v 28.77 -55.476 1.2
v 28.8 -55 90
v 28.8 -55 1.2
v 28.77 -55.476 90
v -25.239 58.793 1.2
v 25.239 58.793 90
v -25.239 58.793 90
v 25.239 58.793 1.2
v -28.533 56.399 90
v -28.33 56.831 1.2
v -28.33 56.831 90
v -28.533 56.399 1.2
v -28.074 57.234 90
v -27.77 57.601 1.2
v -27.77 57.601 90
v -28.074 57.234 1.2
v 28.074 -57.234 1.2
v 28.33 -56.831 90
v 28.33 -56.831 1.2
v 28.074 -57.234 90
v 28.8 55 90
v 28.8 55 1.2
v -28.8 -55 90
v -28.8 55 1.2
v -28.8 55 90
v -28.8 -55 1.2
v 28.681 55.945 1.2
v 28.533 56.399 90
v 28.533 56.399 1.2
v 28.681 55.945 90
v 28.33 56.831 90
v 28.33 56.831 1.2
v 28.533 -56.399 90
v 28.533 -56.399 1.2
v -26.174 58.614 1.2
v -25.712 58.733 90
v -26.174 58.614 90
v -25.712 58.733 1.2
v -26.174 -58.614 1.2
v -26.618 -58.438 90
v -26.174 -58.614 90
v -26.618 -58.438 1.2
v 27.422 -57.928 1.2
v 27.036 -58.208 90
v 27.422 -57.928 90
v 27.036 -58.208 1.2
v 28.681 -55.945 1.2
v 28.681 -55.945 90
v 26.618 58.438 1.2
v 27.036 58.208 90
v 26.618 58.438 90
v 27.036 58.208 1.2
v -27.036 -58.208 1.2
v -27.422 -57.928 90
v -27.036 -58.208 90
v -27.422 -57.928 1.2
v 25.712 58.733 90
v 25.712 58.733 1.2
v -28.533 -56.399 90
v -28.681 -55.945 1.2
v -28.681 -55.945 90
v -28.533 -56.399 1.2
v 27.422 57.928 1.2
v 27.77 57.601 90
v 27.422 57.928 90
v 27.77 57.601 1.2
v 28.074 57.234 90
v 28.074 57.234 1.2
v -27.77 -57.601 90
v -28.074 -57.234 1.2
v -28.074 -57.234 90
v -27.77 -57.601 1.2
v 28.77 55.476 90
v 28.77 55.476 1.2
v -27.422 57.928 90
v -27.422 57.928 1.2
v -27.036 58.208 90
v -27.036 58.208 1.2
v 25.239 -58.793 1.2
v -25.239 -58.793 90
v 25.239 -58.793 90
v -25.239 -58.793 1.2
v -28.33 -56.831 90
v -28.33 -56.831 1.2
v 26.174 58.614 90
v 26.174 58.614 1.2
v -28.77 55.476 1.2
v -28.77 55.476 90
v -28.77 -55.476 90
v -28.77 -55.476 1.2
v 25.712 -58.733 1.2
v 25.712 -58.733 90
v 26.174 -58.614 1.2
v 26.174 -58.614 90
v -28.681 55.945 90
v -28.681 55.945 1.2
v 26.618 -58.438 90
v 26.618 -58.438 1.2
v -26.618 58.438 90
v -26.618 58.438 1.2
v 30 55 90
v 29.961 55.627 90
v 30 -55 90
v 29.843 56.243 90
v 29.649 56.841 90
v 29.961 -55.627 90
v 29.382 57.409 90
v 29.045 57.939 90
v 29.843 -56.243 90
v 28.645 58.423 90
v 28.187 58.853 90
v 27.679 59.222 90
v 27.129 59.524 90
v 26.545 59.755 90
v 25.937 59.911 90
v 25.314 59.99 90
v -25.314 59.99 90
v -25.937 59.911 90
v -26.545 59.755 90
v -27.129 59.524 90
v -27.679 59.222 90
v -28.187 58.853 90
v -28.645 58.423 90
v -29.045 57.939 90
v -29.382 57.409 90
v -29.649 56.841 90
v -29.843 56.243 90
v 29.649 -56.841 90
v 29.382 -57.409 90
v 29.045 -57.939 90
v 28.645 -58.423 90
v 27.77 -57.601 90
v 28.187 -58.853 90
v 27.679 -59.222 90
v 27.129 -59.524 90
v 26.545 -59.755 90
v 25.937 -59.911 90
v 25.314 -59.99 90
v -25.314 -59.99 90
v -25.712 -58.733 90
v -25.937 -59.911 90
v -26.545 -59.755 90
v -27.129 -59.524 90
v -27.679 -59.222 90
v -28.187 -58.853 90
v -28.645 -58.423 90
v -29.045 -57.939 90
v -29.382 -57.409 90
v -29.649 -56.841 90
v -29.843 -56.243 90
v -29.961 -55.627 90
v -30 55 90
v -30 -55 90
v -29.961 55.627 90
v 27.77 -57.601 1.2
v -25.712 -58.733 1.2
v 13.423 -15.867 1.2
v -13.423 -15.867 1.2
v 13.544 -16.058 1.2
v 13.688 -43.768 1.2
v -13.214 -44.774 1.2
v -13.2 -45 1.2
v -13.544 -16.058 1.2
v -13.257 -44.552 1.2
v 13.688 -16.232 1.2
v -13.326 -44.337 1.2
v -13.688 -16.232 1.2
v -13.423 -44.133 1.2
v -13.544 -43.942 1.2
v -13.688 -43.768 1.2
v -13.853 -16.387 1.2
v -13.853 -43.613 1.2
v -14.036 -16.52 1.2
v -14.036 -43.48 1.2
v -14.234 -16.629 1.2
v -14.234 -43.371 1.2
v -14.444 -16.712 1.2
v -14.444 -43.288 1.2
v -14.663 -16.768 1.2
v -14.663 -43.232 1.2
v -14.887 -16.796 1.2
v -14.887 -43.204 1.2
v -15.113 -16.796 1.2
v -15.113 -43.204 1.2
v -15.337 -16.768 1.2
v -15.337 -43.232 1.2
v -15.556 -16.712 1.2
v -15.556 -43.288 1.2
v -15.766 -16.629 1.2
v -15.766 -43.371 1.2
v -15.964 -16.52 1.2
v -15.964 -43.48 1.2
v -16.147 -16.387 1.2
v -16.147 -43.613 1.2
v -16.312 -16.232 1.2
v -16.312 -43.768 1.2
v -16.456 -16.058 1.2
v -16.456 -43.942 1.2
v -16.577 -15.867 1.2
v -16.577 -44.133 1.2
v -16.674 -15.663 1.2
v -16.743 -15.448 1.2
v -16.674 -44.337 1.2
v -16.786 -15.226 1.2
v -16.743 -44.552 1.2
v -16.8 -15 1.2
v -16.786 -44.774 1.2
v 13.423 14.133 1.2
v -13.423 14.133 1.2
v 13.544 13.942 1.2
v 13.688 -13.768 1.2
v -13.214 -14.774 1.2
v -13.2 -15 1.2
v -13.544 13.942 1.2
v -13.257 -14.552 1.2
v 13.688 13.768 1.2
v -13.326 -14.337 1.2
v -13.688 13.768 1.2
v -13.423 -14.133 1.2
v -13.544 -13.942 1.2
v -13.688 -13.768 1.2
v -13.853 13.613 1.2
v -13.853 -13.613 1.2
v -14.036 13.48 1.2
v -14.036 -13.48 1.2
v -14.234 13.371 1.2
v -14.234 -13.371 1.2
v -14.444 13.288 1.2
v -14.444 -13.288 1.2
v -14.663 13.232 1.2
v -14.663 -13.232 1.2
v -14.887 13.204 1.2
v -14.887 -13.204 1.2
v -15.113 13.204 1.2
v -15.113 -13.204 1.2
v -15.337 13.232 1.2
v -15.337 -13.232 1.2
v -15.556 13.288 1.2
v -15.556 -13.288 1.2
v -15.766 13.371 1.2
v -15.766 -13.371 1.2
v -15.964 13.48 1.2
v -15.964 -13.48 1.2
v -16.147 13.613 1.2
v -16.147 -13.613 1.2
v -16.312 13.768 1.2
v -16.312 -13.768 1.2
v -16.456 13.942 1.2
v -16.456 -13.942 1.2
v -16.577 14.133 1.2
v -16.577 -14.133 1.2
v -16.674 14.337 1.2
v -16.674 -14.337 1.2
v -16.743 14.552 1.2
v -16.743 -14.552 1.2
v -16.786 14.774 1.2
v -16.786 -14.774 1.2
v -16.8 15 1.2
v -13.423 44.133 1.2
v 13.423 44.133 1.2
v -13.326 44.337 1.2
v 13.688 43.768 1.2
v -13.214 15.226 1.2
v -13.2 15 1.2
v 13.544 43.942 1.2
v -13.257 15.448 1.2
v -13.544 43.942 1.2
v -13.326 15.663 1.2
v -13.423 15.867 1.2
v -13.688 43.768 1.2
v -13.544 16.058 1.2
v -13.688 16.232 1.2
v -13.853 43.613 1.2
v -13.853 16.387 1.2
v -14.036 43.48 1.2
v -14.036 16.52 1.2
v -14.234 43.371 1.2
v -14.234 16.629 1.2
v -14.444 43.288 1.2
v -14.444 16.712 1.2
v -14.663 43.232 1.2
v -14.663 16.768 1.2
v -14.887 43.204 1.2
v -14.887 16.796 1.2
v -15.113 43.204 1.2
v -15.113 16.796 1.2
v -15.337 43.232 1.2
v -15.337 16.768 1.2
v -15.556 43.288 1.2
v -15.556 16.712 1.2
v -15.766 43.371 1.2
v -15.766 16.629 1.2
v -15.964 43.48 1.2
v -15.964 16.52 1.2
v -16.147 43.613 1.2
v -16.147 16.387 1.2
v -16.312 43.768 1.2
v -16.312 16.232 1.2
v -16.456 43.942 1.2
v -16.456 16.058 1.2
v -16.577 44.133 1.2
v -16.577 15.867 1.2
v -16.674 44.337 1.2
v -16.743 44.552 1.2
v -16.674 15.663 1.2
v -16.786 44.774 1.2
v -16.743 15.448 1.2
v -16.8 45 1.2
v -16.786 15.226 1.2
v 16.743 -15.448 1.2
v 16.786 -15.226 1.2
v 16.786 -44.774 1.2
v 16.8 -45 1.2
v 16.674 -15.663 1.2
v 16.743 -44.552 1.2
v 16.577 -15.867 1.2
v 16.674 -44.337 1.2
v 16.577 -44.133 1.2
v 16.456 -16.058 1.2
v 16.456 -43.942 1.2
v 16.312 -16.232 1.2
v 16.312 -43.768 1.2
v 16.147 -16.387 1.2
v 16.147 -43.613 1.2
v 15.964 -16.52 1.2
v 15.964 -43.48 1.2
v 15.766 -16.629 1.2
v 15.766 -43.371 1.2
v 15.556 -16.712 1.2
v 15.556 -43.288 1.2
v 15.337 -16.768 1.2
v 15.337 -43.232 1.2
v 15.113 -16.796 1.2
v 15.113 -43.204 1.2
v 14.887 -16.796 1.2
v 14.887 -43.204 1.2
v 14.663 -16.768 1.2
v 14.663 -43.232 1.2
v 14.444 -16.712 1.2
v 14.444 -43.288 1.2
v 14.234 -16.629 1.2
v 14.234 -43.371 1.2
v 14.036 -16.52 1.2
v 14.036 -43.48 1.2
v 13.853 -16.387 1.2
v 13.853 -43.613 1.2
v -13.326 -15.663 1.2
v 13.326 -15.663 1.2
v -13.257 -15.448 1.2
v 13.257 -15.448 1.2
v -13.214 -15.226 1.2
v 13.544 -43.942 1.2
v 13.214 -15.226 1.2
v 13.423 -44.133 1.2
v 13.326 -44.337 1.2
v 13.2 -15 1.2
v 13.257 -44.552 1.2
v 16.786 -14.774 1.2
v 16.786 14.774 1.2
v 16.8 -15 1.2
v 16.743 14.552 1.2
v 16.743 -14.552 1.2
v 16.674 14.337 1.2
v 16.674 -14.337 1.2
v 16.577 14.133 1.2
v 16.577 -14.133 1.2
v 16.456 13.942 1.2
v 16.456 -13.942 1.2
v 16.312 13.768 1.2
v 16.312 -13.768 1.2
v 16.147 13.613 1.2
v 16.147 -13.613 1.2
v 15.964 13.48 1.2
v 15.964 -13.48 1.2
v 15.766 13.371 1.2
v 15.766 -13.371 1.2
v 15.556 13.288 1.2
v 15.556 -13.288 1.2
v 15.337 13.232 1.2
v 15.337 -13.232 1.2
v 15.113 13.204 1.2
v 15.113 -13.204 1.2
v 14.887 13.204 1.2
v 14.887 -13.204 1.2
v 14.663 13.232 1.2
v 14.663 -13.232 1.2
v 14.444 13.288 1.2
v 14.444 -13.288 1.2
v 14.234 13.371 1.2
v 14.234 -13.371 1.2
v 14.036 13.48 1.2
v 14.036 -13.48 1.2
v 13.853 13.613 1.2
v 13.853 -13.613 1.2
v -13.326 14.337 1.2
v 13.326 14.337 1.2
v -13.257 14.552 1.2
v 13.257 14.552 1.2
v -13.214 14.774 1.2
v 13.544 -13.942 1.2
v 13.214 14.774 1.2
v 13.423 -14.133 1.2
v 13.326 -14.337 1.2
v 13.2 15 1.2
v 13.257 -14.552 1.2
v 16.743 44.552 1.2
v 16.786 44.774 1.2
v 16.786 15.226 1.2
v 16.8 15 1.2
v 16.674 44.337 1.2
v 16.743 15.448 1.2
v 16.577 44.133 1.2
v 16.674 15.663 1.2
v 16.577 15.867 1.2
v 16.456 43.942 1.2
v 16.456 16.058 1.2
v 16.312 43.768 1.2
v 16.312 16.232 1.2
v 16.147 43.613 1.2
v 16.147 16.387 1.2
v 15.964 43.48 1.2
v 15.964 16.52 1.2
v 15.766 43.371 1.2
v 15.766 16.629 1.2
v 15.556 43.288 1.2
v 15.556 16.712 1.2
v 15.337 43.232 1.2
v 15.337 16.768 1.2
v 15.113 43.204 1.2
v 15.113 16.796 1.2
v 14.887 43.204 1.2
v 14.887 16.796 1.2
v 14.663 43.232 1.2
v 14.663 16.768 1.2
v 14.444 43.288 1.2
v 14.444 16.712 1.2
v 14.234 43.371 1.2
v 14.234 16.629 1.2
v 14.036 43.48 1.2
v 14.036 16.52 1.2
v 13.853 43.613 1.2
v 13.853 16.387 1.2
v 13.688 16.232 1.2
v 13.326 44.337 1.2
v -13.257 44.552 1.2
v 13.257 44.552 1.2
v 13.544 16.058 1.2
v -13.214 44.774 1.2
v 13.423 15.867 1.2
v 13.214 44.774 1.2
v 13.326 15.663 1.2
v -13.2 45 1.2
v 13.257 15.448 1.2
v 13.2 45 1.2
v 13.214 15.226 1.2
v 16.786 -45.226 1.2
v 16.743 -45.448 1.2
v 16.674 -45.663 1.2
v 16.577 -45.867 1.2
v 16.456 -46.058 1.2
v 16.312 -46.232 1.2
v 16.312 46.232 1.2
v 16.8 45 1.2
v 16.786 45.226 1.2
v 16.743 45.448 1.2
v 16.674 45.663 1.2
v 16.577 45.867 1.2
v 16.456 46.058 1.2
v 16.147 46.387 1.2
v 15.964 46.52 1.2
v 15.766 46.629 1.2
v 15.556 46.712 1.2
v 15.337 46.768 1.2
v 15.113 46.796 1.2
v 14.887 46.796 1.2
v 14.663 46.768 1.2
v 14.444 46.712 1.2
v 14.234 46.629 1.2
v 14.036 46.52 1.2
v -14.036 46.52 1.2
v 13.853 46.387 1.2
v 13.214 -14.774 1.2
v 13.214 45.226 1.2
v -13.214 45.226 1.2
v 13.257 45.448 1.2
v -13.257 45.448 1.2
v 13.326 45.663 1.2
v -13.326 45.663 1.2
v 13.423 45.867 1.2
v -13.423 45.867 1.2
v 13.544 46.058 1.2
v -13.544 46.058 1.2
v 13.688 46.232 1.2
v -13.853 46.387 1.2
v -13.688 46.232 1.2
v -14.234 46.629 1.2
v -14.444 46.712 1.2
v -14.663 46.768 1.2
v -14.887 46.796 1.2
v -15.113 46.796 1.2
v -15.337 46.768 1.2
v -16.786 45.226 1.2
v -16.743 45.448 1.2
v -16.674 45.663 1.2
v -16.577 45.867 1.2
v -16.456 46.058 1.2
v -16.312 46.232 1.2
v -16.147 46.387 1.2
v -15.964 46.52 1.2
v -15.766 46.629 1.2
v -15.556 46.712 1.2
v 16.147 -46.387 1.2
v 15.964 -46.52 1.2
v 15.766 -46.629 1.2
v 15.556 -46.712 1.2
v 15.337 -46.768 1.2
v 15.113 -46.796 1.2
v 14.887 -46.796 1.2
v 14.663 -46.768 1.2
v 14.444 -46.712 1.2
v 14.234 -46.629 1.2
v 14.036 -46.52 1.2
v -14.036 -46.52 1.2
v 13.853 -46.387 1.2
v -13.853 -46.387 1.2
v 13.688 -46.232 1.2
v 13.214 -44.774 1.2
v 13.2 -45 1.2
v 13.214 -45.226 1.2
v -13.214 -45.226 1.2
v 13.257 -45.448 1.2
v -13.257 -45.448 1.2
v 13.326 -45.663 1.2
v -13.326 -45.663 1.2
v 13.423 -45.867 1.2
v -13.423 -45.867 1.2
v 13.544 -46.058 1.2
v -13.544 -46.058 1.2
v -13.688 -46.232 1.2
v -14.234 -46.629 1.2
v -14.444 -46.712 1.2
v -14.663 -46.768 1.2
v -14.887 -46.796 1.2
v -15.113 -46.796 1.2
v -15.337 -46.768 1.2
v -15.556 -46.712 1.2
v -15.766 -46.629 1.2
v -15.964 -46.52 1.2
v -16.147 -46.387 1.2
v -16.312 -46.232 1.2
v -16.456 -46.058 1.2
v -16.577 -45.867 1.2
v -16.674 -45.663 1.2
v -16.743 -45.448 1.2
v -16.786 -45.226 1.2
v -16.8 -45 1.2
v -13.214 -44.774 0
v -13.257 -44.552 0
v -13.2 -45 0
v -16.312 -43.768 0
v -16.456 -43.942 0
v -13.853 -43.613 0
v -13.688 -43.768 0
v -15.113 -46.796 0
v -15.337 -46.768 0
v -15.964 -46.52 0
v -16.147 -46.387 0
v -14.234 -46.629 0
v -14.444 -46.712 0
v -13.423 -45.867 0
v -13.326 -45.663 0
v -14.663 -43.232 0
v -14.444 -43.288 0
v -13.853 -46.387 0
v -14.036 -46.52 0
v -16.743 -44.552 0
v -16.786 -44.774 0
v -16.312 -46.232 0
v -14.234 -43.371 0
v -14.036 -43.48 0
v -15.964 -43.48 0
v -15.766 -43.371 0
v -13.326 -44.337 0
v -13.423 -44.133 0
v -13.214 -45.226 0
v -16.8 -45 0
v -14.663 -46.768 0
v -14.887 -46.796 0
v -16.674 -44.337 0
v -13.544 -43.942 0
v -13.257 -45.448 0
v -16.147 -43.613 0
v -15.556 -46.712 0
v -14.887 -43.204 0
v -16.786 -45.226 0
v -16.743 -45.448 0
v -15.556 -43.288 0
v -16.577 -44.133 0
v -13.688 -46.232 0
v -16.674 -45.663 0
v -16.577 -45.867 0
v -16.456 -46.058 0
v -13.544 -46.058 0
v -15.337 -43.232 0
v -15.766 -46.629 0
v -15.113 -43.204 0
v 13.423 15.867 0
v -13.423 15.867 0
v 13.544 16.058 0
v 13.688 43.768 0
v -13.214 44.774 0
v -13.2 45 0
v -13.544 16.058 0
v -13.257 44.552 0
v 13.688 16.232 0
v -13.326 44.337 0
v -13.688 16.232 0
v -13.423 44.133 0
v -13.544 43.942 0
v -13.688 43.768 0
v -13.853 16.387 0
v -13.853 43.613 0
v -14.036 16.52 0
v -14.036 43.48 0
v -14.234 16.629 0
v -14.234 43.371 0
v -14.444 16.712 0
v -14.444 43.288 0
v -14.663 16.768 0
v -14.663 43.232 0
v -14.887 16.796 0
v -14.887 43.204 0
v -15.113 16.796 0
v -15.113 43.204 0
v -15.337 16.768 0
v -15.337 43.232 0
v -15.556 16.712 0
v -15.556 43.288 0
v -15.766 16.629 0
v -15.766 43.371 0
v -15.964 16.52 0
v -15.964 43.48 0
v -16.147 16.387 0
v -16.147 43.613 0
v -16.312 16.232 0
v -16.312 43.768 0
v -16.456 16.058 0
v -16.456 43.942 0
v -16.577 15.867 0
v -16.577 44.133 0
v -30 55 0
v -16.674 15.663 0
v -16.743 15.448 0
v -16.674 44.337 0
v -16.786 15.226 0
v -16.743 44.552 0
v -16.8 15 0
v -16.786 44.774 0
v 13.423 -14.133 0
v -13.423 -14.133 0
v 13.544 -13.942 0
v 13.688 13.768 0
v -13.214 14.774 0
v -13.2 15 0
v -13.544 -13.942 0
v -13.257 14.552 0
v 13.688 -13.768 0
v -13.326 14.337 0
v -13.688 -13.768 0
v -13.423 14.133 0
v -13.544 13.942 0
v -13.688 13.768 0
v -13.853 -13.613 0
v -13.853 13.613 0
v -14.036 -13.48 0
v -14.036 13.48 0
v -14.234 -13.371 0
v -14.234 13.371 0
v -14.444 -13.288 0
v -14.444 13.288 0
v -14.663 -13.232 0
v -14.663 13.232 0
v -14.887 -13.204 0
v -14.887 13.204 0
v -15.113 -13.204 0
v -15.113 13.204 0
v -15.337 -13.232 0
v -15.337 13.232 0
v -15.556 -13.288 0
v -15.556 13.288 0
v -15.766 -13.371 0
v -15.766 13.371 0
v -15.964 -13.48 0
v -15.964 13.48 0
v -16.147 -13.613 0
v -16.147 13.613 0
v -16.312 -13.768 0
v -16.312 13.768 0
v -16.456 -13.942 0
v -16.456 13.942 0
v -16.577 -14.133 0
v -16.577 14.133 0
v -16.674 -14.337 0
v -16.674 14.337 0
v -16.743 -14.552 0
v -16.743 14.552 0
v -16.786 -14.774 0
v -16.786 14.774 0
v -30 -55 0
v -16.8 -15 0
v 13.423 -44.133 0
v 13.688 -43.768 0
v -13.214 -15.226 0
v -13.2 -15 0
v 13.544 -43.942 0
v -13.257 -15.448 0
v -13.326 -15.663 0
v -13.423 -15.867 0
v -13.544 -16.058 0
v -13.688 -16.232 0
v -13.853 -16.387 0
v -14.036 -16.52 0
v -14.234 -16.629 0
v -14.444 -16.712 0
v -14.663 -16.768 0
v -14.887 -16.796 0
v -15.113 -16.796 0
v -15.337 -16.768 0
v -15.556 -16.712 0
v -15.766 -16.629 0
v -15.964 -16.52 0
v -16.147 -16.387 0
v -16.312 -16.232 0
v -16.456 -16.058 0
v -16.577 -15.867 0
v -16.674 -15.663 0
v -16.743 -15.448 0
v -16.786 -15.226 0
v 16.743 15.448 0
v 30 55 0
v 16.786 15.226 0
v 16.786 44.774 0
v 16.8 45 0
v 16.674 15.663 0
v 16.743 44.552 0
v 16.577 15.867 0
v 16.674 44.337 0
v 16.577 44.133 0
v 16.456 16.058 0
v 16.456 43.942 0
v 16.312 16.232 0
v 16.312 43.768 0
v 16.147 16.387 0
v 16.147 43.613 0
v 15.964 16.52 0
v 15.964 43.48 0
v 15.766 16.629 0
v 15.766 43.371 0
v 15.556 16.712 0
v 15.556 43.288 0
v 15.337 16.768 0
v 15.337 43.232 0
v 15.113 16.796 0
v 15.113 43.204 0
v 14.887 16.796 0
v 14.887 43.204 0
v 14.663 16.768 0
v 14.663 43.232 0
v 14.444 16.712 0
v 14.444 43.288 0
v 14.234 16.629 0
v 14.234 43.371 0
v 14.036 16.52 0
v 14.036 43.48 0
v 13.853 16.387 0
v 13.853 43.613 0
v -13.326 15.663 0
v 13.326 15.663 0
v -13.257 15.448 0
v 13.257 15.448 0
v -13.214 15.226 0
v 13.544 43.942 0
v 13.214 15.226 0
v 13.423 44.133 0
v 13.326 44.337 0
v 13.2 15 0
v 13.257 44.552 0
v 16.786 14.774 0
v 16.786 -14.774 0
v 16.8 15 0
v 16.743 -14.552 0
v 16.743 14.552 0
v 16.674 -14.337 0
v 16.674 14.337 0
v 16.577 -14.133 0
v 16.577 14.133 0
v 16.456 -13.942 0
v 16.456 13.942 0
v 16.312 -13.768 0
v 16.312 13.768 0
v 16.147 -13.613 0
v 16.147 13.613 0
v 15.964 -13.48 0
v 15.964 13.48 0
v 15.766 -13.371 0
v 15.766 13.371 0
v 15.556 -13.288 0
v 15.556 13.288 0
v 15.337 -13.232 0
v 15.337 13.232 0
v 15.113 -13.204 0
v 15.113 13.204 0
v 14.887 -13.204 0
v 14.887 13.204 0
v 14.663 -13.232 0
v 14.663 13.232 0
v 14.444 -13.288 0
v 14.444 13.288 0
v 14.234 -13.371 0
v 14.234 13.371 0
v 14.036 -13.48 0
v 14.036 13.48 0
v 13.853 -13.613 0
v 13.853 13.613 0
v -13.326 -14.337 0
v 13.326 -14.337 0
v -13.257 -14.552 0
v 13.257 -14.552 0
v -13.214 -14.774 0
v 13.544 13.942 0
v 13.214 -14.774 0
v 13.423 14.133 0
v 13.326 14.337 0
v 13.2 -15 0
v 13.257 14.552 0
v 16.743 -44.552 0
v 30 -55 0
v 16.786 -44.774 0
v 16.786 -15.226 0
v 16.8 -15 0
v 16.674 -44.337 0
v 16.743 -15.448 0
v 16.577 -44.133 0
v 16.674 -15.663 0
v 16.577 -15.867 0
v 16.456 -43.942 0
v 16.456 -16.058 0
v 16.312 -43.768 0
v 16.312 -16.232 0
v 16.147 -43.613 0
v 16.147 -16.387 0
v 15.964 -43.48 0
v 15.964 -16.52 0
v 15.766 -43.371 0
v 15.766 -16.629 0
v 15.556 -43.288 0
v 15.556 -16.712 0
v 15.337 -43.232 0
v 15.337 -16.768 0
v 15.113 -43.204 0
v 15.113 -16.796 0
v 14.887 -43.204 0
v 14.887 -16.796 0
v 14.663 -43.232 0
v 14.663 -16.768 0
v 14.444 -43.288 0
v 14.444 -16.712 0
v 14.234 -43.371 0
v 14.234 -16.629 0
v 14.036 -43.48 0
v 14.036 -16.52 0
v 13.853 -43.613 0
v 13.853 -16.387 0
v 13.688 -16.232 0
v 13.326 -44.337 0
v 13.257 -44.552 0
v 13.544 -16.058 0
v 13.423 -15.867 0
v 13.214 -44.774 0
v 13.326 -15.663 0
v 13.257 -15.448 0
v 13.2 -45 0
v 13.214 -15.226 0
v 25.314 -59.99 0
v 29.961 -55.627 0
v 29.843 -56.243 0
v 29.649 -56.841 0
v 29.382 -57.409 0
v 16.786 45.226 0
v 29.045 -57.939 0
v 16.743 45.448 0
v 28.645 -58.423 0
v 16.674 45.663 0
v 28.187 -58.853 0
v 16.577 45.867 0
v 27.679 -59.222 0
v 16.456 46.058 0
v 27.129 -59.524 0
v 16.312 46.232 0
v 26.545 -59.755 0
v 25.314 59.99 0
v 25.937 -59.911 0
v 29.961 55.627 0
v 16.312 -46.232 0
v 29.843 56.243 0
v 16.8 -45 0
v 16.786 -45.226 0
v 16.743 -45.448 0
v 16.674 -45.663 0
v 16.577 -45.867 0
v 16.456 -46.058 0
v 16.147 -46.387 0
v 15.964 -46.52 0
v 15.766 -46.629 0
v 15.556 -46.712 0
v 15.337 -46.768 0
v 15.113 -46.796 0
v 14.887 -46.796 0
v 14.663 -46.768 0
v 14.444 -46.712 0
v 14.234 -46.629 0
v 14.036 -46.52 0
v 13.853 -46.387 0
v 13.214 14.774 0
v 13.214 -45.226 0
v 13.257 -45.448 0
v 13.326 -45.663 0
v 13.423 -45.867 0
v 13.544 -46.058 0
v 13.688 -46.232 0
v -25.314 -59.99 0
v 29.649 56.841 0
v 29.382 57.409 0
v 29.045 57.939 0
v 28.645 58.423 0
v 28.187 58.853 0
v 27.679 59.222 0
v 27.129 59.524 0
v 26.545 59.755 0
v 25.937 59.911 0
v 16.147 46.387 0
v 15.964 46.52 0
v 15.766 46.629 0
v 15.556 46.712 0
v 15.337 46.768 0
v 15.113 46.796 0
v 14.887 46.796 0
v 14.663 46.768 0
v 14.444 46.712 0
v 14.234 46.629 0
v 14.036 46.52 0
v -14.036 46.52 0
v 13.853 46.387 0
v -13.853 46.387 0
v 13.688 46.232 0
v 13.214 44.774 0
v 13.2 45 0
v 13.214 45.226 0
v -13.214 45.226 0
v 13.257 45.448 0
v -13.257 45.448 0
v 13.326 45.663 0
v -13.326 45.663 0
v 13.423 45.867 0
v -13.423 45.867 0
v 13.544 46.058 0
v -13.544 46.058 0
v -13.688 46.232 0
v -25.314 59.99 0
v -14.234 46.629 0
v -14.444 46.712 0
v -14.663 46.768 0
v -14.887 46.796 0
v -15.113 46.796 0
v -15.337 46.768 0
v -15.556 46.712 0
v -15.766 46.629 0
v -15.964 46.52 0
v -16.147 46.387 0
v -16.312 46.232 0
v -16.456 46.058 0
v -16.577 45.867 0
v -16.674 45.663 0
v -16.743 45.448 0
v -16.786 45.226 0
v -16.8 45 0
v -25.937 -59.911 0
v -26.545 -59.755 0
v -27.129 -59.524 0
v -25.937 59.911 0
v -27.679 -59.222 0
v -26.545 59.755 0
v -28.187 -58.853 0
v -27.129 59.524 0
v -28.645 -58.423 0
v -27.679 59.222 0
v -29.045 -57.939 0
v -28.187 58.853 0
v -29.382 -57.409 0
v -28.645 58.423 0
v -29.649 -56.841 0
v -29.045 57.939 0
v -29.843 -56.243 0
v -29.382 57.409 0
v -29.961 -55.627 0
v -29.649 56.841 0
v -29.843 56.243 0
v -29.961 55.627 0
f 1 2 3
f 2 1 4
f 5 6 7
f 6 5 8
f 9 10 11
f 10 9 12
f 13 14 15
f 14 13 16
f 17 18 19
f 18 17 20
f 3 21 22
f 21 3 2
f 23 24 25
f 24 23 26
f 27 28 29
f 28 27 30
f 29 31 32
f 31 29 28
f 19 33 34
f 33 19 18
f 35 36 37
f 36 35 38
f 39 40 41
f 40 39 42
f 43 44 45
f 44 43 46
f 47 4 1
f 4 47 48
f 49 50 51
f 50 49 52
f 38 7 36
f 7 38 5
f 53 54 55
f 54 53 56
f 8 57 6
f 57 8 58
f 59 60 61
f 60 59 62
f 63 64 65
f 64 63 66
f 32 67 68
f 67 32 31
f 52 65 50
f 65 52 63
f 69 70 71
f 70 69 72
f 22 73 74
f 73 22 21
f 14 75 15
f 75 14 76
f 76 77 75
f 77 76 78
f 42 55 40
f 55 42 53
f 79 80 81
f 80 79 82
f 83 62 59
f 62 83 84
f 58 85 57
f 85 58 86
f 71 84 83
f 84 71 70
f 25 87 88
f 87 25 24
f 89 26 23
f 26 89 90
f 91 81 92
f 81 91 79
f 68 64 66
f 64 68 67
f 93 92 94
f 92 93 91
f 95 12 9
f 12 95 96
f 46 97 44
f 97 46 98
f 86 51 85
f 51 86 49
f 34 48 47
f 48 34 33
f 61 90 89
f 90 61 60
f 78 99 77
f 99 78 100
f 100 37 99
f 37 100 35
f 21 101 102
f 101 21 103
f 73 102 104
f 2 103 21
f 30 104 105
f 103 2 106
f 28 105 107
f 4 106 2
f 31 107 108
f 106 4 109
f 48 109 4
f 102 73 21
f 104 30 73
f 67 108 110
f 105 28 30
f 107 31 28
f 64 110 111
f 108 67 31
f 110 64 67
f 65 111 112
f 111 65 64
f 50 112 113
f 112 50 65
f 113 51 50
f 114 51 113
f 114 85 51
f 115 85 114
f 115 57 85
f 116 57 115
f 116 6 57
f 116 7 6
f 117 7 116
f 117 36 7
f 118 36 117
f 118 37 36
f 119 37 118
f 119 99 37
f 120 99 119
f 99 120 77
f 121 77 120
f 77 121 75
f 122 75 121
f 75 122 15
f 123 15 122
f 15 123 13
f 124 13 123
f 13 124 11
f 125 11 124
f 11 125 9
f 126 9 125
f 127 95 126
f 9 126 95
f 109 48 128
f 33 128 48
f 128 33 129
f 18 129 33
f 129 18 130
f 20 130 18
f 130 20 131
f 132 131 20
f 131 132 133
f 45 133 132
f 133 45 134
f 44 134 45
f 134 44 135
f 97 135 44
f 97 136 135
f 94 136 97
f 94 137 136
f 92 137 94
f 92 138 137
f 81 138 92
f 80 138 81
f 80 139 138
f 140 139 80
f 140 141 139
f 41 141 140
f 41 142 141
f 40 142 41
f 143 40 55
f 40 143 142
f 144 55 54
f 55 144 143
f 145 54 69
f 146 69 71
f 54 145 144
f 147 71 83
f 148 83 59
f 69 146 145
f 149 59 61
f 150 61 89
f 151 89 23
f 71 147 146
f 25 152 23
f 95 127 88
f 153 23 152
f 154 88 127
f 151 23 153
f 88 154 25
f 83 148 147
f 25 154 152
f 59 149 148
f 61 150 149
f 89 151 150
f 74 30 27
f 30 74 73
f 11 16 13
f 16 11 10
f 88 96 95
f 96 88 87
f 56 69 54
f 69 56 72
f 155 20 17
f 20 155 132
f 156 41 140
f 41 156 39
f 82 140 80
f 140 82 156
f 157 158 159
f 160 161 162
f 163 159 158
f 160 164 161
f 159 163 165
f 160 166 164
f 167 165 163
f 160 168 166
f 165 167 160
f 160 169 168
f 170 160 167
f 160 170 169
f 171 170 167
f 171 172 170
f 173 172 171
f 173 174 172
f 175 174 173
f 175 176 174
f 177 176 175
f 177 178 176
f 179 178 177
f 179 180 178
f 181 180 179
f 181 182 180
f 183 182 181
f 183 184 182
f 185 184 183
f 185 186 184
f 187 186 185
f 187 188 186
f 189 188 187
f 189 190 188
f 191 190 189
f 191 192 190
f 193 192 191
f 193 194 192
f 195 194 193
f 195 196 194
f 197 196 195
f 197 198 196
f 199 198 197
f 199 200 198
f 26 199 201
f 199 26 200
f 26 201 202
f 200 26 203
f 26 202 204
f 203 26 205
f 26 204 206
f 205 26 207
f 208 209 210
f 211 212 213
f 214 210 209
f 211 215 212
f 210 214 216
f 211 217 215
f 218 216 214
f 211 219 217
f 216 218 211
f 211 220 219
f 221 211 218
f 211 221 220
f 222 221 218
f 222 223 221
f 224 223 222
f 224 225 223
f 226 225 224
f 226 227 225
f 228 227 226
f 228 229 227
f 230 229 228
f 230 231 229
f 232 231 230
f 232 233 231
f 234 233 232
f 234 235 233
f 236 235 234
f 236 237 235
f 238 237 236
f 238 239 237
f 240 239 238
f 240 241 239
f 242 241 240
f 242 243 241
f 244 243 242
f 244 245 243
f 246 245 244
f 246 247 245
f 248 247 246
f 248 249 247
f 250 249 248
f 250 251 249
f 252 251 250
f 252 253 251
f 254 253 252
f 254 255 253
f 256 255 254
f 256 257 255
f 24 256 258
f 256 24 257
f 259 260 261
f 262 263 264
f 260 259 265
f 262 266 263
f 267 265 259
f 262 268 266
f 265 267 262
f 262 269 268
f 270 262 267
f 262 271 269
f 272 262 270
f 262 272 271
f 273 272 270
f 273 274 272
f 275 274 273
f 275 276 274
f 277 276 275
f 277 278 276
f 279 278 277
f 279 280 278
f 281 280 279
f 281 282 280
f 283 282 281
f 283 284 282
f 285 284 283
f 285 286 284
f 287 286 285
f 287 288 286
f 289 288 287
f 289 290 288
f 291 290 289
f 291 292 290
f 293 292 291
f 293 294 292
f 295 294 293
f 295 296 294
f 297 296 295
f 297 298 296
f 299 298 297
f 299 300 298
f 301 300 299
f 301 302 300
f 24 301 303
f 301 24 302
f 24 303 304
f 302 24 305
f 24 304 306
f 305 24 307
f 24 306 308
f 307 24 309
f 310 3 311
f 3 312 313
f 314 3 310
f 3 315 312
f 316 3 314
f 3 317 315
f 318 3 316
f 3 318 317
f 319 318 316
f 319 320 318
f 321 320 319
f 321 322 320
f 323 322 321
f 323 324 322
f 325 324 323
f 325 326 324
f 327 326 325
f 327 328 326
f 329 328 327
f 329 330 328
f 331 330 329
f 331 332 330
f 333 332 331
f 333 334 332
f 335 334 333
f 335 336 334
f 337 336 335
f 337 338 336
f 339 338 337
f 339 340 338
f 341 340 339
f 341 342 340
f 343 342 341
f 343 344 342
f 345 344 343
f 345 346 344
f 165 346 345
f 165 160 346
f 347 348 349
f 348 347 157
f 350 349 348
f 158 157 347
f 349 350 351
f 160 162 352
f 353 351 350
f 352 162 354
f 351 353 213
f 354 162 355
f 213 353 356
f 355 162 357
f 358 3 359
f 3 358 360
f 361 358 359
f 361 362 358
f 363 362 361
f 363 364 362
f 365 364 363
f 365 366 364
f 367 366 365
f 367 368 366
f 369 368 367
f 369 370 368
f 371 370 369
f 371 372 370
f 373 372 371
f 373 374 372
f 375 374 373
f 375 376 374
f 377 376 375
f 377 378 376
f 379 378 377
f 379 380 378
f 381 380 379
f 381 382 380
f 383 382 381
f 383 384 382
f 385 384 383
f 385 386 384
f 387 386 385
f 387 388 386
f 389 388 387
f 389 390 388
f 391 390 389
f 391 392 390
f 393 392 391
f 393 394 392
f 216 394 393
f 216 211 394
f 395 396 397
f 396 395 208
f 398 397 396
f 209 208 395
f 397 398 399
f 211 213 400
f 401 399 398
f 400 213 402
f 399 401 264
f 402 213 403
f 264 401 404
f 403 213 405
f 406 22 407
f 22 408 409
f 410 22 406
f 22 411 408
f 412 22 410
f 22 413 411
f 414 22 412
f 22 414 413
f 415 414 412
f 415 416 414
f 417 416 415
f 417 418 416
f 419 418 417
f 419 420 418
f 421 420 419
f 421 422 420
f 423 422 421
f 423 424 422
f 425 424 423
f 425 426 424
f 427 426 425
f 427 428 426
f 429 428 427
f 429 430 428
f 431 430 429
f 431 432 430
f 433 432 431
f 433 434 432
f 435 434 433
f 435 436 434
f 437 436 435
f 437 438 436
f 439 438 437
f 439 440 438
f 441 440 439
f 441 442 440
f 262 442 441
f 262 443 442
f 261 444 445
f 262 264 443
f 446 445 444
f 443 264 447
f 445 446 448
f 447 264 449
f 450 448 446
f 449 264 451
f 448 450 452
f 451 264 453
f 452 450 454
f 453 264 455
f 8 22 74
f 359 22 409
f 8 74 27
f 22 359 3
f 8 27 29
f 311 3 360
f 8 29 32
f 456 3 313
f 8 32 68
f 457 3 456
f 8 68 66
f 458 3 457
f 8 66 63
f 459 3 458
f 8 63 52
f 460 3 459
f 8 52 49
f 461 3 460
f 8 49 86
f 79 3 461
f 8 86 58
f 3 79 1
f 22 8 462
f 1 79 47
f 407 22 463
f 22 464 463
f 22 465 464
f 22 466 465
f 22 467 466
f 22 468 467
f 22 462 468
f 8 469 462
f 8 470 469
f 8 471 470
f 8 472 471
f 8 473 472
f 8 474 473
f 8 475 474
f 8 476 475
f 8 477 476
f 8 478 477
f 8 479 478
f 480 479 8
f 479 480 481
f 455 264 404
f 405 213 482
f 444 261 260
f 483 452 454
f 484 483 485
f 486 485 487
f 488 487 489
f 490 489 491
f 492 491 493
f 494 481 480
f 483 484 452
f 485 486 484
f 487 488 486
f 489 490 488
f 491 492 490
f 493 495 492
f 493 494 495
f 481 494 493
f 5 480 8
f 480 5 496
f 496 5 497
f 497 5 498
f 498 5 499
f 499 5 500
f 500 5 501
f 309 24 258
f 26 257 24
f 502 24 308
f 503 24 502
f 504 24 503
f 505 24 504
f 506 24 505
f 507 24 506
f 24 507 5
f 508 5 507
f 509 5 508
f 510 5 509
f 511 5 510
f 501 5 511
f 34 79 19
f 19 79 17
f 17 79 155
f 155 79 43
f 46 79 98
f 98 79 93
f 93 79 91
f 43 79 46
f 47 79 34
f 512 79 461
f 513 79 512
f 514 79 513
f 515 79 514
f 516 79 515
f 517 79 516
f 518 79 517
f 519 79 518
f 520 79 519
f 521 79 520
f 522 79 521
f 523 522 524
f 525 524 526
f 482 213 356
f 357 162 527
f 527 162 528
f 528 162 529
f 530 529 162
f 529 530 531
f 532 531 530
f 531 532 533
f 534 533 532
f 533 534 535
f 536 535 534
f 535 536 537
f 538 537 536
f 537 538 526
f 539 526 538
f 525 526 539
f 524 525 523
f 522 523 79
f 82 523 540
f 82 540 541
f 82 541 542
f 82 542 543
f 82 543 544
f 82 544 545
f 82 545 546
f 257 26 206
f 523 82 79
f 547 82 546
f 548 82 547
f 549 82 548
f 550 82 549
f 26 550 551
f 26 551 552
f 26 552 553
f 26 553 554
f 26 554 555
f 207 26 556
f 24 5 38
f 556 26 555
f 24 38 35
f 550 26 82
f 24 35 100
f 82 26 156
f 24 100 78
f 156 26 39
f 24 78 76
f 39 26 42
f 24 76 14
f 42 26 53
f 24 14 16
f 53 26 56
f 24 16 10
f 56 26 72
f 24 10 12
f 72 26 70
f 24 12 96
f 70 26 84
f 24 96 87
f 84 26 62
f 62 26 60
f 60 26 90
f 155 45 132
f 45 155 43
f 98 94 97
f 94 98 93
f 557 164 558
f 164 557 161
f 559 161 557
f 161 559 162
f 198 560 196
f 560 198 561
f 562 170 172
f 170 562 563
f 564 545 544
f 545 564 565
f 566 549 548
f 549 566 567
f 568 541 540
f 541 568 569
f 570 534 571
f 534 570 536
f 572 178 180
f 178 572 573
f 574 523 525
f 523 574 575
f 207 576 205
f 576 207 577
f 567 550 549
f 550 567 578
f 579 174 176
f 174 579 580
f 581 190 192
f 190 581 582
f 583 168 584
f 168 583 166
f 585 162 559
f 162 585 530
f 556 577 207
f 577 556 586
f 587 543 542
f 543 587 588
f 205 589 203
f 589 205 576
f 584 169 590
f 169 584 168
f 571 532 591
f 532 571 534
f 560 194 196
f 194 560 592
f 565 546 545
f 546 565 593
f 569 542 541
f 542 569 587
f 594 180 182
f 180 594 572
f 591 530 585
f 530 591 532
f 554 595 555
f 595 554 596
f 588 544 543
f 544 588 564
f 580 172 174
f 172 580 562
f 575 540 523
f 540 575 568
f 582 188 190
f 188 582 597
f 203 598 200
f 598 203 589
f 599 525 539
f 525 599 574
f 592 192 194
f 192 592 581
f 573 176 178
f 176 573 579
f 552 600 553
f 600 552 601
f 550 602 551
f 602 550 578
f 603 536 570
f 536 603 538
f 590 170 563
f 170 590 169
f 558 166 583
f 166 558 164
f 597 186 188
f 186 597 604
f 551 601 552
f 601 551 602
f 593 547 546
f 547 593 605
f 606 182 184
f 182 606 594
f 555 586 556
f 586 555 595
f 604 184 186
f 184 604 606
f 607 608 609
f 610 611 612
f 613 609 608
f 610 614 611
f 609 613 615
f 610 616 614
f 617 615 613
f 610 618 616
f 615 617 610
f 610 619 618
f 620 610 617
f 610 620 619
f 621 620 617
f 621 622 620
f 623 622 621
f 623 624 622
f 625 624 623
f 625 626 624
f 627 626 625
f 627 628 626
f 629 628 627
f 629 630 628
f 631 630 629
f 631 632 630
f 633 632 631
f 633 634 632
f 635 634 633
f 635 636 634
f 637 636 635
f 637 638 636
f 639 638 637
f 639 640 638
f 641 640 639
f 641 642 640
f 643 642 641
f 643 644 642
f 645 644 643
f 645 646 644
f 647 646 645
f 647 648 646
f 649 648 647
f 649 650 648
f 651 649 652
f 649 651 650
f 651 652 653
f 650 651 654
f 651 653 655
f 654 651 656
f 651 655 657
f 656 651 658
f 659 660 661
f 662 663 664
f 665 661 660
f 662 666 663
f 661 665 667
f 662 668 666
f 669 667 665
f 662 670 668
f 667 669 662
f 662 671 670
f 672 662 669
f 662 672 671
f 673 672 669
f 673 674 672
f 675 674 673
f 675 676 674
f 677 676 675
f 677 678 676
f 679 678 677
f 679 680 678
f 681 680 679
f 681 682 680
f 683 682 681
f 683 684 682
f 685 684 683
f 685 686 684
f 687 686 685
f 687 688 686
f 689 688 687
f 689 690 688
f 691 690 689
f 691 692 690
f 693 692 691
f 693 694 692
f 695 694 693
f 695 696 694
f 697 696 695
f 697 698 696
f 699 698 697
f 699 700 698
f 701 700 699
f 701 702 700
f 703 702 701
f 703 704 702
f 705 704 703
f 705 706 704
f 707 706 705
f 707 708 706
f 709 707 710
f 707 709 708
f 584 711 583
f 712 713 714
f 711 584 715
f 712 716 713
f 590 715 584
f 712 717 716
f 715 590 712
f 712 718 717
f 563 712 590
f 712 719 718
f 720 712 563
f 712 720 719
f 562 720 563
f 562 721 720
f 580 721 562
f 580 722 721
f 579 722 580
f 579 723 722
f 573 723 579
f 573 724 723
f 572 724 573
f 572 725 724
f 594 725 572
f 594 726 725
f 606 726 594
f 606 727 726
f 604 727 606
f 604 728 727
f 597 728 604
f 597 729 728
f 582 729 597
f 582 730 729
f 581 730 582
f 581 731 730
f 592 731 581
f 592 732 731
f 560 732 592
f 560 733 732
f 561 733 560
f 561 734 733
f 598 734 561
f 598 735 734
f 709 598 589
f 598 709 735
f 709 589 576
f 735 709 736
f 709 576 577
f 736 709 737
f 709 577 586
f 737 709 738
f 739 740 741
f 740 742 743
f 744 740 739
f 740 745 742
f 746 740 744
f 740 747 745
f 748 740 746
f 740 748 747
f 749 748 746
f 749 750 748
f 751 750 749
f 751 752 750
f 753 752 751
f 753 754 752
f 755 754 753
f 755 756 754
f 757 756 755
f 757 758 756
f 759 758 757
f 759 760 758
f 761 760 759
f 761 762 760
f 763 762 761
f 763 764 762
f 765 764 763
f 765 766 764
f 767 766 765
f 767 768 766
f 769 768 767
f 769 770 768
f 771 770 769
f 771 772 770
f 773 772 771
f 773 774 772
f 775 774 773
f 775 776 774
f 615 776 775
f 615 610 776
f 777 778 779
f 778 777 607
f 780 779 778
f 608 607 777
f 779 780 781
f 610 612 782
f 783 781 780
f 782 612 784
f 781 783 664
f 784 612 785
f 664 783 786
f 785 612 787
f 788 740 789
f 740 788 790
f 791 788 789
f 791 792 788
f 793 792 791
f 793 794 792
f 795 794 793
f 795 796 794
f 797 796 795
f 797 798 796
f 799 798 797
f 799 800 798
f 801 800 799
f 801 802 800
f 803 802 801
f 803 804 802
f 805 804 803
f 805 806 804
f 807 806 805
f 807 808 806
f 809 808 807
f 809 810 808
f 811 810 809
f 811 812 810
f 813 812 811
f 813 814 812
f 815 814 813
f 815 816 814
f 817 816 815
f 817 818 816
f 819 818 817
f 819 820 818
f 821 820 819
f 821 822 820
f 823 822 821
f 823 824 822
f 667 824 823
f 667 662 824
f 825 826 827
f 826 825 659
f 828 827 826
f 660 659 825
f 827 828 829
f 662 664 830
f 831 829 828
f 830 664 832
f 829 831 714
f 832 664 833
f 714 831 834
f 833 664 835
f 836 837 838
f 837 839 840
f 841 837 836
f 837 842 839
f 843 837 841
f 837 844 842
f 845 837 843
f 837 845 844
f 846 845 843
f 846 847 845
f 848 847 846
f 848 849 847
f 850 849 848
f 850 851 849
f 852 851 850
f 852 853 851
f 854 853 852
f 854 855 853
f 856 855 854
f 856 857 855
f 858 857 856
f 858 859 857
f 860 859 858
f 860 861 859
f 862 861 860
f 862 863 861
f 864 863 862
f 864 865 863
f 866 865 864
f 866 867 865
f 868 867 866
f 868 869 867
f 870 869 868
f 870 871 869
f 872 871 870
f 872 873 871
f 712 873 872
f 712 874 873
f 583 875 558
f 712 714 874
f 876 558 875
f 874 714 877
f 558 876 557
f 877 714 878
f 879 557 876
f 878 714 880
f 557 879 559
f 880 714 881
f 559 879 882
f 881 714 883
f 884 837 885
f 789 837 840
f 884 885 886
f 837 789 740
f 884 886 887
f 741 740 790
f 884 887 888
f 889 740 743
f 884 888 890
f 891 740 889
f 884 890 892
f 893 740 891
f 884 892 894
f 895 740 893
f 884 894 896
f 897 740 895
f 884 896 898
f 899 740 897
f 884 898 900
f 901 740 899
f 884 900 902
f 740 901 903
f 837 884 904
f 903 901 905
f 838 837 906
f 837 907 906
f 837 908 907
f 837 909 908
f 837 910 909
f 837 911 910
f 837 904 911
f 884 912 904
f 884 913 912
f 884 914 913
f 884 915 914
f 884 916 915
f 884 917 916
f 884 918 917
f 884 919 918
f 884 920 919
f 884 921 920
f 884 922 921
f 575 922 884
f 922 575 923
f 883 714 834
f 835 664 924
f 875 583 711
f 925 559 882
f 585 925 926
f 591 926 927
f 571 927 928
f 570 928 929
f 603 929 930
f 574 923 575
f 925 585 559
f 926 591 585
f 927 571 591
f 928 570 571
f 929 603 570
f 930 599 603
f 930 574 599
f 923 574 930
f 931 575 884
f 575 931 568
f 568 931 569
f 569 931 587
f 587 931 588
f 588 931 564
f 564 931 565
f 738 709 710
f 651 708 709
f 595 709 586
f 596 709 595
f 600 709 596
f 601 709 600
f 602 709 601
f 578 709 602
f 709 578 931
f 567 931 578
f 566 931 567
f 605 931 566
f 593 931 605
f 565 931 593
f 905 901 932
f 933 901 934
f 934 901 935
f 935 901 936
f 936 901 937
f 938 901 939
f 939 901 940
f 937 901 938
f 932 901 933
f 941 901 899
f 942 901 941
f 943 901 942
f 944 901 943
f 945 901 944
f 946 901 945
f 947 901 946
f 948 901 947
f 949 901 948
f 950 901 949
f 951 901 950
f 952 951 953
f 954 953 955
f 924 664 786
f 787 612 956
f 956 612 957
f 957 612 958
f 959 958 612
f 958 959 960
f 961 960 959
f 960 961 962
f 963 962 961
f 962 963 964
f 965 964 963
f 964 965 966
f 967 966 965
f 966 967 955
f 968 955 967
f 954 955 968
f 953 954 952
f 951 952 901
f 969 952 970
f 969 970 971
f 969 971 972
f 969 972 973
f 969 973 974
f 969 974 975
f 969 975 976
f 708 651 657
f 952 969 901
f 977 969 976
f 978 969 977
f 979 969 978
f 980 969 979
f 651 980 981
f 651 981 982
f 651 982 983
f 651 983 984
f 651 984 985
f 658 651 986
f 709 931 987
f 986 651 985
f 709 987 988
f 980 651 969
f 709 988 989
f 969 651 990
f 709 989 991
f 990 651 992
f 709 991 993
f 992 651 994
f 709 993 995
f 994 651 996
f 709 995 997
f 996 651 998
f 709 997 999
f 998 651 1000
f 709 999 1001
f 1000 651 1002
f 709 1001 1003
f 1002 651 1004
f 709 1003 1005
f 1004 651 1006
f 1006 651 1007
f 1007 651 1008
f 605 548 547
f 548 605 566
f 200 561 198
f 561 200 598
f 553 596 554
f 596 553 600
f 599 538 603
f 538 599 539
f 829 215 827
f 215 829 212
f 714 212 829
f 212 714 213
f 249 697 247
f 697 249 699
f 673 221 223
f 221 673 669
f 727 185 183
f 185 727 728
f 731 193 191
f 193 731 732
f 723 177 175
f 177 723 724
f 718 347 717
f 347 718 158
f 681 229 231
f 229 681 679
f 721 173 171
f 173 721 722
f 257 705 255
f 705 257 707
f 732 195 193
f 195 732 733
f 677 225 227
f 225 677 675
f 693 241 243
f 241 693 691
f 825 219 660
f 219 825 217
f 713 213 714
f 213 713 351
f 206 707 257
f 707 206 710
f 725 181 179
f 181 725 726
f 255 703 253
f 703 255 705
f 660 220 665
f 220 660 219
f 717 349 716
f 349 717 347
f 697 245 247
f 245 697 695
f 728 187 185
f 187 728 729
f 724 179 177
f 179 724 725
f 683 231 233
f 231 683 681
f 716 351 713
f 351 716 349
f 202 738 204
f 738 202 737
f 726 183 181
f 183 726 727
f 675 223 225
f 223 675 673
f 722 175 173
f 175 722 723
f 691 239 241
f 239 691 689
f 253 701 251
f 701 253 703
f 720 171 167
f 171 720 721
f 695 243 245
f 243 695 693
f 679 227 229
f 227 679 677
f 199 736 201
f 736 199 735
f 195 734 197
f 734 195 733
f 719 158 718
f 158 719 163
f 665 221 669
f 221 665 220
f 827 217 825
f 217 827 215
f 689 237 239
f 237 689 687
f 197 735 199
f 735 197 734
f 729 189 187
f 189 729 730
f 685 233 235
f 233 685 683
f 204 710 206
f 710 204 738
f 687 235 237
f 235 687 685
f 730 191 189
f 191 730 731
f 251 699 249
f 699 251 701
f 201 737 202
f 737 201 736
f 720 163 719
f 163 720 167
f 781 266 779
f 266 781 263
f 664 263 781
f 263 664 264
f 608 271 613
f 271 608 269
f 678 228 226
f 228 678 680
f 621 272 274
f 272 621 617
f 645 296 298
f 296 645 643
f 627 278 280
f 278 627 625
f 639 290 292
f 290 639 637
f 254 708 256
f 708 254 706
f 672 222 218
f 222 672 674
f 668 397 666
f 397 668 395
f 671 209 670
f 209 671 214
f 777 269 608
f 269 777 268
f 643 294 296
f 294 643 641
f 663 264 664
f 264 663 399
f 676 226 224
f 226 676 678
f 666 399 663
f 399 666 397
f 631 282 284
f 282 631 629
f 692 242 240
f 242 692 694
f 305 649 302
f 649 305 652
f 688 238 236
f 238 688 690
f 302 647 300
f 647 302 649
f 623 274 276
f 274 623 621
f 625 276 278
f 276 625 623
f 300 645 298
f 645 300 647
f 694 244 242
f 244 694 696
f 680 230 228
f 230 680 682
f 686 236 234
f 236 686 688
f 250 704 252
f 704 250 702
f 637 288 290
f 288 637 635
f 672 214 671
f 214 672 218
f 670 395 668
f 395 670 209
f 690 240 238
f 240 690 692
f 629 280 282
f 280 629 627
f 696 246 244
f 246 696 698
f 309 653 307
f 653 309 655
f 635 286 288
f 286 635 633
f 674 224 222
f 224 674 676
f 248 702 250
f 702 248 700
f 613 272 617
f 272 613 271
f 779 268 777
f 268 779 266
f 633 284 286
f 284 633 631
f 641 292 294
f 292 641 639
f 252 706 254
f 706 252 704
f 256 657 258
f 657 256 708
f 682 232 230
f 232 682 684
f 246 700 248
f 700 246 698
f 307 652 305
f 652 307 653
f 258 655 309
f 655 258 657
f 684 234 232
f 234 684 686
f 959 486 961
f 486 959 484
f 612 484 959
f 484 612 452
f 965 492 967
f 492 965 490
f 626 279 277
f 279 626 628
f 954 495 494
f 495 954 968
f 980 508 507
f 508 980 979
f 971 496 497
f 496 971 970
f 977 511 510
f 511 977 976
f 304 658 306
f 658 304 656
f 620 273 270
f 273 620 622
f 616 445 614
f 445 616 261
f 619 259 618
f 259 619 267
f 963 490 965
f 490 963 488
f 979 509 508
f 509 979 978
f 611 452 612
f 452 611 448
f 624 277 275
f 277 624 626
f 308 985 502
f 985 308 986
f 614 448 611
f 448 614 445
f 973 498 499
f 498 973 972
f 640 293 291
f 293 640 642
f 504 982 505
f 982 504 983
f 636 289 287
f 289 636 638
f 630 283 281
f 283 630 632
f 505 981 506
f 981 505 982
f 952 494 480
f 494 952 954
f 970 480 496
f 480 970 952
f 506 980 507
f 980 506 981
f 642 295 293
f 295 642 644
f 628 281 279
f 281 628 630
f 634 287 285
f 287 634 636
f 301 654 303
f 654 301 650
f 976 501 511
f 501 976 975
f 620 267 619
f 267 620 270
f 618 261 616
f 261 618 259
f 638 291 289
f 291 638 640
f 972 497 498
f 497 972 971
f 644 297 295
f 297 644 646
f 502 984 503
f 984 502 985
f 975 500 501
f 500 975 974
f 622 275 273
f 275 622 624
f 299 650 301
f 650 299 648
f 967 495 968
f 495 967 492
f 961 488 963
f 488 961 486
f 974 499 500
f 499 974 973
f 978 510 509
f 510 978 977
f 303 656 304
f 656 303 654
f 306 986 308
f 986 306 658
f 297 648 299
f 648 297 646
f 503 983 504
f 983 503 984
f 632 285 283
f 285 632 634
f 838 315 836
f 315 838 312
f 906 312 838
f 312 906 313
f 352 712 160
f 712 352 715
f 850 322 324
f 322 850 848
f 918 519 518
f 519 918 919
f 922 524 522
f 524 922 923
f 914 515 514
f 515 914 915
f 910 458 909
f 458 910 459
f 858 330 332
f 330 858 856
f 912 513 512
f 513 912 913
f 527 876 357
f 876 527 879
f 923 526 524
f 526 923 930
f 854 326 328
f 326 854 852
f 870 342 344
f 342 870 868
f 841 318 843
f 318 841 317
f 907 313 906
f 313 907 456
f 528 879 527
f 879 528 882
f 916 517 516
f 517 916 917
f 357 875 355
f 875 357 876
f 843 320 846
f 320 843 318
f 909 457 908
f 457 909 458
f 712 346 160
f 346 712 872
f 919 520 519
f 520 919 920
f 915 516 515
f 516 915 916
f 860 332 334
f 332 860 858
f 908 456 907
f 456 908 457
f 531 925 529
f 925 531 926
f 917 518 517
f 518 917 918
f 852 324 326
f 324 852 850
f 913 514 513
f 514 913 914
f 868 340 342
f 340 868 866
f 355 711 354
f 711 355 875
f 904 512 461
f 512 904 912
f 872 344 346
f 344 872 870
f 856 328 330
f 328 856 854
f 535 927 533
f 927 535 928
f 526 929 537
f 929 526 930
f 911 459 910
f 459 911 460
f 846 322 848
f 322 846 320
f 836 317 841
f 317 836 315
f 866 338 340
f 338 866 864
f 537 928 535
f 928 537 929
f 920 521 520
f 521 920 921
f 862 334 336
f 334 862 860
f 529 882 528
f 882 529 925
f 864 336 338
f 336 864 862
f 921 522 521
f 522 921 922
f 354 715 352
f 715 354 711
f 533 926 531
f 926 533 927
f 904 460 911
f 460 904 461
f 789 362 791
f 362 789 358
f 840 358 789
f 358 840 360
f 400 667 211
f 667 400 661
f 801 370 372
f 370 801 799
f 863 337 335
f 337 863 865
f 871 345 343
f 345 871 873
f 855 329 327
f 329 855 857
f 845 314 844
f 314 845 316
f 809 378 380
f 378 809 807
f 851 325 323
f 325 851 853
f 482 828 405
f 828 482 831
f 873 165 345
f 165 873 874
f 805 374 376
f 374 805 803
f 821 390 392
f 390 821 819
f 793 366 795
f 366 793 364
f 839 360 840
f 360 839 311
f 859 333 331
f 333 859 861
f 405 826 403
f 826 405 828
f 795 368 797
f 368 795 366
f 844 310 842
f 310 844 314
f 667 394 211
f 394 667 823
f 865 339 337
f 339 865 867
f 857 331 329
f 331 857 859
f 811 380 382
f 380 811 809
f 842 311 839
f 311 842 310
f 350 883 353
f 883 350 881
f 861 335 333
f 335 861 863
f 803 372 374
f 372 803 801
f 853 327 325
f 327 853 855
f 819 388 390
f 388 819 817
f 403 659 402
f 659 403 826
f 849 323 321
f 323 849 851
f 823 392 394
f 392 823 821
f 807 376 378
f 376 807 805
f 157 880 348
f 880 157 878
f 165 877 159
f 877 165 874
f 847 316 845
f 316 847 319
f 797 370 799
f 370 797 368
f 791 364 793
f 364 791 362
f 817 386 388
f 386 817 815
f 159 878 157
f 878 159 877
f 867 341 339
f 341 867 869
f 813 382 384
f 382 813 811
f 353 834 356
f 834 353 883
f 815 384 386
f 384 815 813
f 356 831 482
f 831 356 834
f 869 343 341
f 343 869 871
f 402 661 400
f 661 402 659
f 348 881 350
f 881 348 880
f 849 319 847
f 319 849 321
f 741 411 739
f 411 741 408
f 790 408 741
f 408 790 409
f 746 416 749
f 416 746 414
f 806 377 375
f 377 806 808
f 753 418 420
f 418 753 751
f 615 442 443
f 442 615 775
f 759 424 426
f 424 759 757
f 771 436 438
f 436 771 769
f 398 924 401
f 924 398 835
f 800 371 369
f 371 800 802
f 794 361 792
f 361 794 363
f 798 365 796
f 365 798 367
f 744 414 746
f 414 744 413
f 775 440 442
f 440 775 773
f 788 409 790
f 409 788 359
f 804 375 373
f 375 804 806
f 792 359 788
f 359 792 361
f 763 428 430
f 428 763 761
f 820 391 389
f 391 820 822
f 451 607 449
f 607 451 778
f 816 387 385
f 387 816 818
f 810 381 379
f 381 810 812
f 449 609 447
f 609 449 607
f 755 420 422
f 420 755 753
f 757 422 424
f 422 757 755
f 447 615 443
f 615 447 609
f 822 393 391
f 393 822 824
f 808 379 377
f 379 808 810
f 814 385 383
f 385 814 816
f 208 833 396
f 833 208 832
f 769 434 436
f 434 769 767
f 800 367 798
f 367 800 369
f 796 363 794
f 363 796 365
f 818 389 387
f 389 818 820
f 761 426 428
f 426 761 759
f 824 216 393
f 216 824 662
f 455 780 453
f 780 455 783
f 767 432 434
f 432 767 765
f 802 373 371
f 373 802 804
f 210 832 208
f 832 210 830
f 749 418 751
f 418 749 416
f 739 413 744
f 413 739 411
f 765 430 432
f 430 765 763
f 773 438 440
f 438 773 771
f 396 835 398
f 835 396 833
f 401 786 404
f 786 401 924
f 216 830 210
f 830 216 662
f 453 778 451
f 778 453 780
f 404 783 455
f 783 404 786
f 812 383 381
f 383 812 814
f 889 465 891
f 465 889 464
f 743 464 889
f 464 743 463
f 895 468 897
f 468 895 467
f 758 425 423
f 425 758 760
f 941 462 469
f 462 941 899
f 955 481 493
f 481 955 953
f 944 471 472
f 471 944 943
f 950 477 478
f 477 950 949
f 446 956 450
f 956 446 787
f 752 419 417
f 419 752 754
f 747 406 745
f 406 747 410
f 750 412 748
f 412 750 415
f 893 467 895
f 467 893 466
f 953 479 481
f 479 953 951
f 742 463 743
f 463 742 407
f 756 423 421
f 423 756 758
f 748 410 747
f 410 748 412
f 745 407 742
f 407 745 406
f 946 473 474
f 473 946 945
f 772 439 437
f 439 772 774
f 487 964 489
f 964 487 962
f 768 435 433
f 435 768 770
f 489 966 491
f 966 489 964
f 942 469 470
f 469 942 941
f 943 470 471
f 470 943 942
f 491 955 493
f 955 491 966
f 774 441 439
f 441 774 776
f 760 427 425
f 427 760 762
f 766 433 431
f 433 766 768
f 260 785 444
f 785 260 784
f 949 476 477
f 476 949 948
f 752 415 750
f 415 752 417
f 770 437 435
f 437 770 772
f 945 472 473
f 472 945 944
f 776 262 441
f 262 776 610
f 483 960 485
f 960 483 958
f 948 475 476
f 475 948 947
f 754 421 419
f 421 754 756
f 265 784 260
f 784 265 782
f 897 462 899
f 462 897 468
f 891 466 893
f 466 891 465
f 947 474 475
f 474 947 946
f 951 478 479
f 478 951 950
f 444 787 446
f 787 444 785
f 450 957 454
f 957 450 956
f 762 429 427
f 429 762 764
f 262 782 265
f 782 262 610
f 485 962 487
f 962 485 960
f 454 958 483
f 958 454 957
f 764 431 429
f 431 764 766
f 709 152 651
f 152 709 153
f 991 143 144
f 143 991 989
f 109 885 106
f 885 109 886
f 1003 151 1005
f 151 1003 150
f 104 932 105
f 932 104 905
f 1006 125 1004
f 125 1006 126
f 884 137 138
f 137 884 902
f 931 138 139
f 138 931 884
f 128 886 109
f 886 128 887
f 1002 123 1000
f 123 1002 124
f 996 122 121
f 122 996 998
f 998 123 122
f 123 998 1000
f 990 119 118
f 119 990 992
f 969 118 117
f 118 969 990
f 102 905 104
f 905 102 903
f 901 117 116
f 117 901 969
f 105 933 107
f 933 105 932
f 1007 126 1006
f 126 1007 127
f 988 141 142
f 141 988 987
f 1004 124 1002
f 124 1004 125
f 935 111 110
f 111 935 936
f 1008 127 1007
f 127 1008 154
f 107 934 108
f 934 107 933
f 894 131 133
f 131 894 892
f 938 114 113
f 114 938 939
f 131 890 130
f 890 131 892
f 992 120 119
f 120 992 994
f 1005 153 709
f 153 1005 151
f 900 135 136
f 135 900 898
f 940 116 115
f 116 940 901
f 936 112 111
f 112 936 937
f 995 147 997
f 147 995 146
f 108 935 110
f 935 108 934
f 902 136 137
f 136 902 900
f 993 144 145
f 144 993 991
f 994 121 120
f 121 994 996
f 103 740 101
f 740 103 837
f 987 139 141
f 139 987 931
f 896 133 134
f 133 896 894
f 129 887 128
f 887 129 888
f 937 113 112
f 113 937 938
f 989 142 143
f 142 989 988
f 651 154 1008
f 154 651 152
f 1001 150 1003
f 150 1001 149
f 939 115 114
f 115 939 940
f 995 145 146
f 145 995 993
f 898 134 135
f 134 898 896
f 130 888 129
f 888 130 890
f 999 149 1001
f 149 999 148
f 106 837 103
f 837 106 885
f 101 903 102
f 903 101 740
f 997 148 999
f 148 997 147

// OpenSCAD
$fn = 50;


difference() {
	union() {
		hull() {
			translate(v = [-25.0000000000, 55.0000000000, 0]) {
				cylinder(h = 90, r = 5);
			}
			translate(v = [25.0000000000, 55.0000000000, 0]) {
				cylinder(h = 90, r = 5);
			}
			translate(v = [-25.0000000000, -55.0000000000, 0]) {
				cylinder(h = 90, r = 5);
			}
			translate(v = [25.0000000000, -55.0000000000, 0]) {
				cylinder(h = 90, r = 5);
			}
		}
	}
	union() {
		translate(v = [0, 0, 1.2000000000]) {
			hull() {
				translate(v = [-25.0000000000, 55.0000000000, 0]) {
					cylinder(h = 88.8000000000, r = 3.8000000000);
				}
				translate(v = [25.0000000000, 55.0000000000, 0]) {
					cylinder(h = 88.8000000000, r = 3.8000000000);
				}
				translate(v = [-25.0000000000, -55.0000000000, 0]) {
					cylinder(h = 88.8000000000, r = 3.8000000000);
				}
				translate(v = [25.0000000000, -55.0000000000, 0]) {
					cylinder(h = 88.8000000000, r = 3.8000000000);
				}
			}
		}
		#translate(v = [-15.0000000000, -45.0000000000, 0]) {
			cylinder(h = 1.2000000000, r = 1.8000000000);
		}
		#translate(v = [-15.0000000000, -15.0000000000, 0]) {
			cylinder(h = 1.2000000000, r = 1.8000000000);
		}
		#translate(v = [-15.0000000000, 15.0000000000, 0]) {
			cylinder(h = 1.2000000000, r = 1.8000000000);
		}
		#translate(v = [-15.0000000000, 45.0000000000, 0]) {
			cylinder(h = 1.2000000000, r = 1.8000000000);
		}
		#translate(v = [15.0000000000, -45.0000000000, 0]) {
			cylinder(h = 1.2000000000, r = 1.8000000000);
		}
		#translate(v = [15.0000000000, -15.0000000000, 0]) {
			cylinder(h = 1.2000000000, r = 1.8000000000);
		}
		#translate(v = [15.0000000000, 15.0000000000, 0]) {
			cylinder(h = 1.2000000000, r = 1.8000000000);
		}
		#translate(v = [15.0000000000, 45.0000000000, 0]) {
			cylinder(h = 1.2000000000, r = 1.8000000000);
		}
	}
}
